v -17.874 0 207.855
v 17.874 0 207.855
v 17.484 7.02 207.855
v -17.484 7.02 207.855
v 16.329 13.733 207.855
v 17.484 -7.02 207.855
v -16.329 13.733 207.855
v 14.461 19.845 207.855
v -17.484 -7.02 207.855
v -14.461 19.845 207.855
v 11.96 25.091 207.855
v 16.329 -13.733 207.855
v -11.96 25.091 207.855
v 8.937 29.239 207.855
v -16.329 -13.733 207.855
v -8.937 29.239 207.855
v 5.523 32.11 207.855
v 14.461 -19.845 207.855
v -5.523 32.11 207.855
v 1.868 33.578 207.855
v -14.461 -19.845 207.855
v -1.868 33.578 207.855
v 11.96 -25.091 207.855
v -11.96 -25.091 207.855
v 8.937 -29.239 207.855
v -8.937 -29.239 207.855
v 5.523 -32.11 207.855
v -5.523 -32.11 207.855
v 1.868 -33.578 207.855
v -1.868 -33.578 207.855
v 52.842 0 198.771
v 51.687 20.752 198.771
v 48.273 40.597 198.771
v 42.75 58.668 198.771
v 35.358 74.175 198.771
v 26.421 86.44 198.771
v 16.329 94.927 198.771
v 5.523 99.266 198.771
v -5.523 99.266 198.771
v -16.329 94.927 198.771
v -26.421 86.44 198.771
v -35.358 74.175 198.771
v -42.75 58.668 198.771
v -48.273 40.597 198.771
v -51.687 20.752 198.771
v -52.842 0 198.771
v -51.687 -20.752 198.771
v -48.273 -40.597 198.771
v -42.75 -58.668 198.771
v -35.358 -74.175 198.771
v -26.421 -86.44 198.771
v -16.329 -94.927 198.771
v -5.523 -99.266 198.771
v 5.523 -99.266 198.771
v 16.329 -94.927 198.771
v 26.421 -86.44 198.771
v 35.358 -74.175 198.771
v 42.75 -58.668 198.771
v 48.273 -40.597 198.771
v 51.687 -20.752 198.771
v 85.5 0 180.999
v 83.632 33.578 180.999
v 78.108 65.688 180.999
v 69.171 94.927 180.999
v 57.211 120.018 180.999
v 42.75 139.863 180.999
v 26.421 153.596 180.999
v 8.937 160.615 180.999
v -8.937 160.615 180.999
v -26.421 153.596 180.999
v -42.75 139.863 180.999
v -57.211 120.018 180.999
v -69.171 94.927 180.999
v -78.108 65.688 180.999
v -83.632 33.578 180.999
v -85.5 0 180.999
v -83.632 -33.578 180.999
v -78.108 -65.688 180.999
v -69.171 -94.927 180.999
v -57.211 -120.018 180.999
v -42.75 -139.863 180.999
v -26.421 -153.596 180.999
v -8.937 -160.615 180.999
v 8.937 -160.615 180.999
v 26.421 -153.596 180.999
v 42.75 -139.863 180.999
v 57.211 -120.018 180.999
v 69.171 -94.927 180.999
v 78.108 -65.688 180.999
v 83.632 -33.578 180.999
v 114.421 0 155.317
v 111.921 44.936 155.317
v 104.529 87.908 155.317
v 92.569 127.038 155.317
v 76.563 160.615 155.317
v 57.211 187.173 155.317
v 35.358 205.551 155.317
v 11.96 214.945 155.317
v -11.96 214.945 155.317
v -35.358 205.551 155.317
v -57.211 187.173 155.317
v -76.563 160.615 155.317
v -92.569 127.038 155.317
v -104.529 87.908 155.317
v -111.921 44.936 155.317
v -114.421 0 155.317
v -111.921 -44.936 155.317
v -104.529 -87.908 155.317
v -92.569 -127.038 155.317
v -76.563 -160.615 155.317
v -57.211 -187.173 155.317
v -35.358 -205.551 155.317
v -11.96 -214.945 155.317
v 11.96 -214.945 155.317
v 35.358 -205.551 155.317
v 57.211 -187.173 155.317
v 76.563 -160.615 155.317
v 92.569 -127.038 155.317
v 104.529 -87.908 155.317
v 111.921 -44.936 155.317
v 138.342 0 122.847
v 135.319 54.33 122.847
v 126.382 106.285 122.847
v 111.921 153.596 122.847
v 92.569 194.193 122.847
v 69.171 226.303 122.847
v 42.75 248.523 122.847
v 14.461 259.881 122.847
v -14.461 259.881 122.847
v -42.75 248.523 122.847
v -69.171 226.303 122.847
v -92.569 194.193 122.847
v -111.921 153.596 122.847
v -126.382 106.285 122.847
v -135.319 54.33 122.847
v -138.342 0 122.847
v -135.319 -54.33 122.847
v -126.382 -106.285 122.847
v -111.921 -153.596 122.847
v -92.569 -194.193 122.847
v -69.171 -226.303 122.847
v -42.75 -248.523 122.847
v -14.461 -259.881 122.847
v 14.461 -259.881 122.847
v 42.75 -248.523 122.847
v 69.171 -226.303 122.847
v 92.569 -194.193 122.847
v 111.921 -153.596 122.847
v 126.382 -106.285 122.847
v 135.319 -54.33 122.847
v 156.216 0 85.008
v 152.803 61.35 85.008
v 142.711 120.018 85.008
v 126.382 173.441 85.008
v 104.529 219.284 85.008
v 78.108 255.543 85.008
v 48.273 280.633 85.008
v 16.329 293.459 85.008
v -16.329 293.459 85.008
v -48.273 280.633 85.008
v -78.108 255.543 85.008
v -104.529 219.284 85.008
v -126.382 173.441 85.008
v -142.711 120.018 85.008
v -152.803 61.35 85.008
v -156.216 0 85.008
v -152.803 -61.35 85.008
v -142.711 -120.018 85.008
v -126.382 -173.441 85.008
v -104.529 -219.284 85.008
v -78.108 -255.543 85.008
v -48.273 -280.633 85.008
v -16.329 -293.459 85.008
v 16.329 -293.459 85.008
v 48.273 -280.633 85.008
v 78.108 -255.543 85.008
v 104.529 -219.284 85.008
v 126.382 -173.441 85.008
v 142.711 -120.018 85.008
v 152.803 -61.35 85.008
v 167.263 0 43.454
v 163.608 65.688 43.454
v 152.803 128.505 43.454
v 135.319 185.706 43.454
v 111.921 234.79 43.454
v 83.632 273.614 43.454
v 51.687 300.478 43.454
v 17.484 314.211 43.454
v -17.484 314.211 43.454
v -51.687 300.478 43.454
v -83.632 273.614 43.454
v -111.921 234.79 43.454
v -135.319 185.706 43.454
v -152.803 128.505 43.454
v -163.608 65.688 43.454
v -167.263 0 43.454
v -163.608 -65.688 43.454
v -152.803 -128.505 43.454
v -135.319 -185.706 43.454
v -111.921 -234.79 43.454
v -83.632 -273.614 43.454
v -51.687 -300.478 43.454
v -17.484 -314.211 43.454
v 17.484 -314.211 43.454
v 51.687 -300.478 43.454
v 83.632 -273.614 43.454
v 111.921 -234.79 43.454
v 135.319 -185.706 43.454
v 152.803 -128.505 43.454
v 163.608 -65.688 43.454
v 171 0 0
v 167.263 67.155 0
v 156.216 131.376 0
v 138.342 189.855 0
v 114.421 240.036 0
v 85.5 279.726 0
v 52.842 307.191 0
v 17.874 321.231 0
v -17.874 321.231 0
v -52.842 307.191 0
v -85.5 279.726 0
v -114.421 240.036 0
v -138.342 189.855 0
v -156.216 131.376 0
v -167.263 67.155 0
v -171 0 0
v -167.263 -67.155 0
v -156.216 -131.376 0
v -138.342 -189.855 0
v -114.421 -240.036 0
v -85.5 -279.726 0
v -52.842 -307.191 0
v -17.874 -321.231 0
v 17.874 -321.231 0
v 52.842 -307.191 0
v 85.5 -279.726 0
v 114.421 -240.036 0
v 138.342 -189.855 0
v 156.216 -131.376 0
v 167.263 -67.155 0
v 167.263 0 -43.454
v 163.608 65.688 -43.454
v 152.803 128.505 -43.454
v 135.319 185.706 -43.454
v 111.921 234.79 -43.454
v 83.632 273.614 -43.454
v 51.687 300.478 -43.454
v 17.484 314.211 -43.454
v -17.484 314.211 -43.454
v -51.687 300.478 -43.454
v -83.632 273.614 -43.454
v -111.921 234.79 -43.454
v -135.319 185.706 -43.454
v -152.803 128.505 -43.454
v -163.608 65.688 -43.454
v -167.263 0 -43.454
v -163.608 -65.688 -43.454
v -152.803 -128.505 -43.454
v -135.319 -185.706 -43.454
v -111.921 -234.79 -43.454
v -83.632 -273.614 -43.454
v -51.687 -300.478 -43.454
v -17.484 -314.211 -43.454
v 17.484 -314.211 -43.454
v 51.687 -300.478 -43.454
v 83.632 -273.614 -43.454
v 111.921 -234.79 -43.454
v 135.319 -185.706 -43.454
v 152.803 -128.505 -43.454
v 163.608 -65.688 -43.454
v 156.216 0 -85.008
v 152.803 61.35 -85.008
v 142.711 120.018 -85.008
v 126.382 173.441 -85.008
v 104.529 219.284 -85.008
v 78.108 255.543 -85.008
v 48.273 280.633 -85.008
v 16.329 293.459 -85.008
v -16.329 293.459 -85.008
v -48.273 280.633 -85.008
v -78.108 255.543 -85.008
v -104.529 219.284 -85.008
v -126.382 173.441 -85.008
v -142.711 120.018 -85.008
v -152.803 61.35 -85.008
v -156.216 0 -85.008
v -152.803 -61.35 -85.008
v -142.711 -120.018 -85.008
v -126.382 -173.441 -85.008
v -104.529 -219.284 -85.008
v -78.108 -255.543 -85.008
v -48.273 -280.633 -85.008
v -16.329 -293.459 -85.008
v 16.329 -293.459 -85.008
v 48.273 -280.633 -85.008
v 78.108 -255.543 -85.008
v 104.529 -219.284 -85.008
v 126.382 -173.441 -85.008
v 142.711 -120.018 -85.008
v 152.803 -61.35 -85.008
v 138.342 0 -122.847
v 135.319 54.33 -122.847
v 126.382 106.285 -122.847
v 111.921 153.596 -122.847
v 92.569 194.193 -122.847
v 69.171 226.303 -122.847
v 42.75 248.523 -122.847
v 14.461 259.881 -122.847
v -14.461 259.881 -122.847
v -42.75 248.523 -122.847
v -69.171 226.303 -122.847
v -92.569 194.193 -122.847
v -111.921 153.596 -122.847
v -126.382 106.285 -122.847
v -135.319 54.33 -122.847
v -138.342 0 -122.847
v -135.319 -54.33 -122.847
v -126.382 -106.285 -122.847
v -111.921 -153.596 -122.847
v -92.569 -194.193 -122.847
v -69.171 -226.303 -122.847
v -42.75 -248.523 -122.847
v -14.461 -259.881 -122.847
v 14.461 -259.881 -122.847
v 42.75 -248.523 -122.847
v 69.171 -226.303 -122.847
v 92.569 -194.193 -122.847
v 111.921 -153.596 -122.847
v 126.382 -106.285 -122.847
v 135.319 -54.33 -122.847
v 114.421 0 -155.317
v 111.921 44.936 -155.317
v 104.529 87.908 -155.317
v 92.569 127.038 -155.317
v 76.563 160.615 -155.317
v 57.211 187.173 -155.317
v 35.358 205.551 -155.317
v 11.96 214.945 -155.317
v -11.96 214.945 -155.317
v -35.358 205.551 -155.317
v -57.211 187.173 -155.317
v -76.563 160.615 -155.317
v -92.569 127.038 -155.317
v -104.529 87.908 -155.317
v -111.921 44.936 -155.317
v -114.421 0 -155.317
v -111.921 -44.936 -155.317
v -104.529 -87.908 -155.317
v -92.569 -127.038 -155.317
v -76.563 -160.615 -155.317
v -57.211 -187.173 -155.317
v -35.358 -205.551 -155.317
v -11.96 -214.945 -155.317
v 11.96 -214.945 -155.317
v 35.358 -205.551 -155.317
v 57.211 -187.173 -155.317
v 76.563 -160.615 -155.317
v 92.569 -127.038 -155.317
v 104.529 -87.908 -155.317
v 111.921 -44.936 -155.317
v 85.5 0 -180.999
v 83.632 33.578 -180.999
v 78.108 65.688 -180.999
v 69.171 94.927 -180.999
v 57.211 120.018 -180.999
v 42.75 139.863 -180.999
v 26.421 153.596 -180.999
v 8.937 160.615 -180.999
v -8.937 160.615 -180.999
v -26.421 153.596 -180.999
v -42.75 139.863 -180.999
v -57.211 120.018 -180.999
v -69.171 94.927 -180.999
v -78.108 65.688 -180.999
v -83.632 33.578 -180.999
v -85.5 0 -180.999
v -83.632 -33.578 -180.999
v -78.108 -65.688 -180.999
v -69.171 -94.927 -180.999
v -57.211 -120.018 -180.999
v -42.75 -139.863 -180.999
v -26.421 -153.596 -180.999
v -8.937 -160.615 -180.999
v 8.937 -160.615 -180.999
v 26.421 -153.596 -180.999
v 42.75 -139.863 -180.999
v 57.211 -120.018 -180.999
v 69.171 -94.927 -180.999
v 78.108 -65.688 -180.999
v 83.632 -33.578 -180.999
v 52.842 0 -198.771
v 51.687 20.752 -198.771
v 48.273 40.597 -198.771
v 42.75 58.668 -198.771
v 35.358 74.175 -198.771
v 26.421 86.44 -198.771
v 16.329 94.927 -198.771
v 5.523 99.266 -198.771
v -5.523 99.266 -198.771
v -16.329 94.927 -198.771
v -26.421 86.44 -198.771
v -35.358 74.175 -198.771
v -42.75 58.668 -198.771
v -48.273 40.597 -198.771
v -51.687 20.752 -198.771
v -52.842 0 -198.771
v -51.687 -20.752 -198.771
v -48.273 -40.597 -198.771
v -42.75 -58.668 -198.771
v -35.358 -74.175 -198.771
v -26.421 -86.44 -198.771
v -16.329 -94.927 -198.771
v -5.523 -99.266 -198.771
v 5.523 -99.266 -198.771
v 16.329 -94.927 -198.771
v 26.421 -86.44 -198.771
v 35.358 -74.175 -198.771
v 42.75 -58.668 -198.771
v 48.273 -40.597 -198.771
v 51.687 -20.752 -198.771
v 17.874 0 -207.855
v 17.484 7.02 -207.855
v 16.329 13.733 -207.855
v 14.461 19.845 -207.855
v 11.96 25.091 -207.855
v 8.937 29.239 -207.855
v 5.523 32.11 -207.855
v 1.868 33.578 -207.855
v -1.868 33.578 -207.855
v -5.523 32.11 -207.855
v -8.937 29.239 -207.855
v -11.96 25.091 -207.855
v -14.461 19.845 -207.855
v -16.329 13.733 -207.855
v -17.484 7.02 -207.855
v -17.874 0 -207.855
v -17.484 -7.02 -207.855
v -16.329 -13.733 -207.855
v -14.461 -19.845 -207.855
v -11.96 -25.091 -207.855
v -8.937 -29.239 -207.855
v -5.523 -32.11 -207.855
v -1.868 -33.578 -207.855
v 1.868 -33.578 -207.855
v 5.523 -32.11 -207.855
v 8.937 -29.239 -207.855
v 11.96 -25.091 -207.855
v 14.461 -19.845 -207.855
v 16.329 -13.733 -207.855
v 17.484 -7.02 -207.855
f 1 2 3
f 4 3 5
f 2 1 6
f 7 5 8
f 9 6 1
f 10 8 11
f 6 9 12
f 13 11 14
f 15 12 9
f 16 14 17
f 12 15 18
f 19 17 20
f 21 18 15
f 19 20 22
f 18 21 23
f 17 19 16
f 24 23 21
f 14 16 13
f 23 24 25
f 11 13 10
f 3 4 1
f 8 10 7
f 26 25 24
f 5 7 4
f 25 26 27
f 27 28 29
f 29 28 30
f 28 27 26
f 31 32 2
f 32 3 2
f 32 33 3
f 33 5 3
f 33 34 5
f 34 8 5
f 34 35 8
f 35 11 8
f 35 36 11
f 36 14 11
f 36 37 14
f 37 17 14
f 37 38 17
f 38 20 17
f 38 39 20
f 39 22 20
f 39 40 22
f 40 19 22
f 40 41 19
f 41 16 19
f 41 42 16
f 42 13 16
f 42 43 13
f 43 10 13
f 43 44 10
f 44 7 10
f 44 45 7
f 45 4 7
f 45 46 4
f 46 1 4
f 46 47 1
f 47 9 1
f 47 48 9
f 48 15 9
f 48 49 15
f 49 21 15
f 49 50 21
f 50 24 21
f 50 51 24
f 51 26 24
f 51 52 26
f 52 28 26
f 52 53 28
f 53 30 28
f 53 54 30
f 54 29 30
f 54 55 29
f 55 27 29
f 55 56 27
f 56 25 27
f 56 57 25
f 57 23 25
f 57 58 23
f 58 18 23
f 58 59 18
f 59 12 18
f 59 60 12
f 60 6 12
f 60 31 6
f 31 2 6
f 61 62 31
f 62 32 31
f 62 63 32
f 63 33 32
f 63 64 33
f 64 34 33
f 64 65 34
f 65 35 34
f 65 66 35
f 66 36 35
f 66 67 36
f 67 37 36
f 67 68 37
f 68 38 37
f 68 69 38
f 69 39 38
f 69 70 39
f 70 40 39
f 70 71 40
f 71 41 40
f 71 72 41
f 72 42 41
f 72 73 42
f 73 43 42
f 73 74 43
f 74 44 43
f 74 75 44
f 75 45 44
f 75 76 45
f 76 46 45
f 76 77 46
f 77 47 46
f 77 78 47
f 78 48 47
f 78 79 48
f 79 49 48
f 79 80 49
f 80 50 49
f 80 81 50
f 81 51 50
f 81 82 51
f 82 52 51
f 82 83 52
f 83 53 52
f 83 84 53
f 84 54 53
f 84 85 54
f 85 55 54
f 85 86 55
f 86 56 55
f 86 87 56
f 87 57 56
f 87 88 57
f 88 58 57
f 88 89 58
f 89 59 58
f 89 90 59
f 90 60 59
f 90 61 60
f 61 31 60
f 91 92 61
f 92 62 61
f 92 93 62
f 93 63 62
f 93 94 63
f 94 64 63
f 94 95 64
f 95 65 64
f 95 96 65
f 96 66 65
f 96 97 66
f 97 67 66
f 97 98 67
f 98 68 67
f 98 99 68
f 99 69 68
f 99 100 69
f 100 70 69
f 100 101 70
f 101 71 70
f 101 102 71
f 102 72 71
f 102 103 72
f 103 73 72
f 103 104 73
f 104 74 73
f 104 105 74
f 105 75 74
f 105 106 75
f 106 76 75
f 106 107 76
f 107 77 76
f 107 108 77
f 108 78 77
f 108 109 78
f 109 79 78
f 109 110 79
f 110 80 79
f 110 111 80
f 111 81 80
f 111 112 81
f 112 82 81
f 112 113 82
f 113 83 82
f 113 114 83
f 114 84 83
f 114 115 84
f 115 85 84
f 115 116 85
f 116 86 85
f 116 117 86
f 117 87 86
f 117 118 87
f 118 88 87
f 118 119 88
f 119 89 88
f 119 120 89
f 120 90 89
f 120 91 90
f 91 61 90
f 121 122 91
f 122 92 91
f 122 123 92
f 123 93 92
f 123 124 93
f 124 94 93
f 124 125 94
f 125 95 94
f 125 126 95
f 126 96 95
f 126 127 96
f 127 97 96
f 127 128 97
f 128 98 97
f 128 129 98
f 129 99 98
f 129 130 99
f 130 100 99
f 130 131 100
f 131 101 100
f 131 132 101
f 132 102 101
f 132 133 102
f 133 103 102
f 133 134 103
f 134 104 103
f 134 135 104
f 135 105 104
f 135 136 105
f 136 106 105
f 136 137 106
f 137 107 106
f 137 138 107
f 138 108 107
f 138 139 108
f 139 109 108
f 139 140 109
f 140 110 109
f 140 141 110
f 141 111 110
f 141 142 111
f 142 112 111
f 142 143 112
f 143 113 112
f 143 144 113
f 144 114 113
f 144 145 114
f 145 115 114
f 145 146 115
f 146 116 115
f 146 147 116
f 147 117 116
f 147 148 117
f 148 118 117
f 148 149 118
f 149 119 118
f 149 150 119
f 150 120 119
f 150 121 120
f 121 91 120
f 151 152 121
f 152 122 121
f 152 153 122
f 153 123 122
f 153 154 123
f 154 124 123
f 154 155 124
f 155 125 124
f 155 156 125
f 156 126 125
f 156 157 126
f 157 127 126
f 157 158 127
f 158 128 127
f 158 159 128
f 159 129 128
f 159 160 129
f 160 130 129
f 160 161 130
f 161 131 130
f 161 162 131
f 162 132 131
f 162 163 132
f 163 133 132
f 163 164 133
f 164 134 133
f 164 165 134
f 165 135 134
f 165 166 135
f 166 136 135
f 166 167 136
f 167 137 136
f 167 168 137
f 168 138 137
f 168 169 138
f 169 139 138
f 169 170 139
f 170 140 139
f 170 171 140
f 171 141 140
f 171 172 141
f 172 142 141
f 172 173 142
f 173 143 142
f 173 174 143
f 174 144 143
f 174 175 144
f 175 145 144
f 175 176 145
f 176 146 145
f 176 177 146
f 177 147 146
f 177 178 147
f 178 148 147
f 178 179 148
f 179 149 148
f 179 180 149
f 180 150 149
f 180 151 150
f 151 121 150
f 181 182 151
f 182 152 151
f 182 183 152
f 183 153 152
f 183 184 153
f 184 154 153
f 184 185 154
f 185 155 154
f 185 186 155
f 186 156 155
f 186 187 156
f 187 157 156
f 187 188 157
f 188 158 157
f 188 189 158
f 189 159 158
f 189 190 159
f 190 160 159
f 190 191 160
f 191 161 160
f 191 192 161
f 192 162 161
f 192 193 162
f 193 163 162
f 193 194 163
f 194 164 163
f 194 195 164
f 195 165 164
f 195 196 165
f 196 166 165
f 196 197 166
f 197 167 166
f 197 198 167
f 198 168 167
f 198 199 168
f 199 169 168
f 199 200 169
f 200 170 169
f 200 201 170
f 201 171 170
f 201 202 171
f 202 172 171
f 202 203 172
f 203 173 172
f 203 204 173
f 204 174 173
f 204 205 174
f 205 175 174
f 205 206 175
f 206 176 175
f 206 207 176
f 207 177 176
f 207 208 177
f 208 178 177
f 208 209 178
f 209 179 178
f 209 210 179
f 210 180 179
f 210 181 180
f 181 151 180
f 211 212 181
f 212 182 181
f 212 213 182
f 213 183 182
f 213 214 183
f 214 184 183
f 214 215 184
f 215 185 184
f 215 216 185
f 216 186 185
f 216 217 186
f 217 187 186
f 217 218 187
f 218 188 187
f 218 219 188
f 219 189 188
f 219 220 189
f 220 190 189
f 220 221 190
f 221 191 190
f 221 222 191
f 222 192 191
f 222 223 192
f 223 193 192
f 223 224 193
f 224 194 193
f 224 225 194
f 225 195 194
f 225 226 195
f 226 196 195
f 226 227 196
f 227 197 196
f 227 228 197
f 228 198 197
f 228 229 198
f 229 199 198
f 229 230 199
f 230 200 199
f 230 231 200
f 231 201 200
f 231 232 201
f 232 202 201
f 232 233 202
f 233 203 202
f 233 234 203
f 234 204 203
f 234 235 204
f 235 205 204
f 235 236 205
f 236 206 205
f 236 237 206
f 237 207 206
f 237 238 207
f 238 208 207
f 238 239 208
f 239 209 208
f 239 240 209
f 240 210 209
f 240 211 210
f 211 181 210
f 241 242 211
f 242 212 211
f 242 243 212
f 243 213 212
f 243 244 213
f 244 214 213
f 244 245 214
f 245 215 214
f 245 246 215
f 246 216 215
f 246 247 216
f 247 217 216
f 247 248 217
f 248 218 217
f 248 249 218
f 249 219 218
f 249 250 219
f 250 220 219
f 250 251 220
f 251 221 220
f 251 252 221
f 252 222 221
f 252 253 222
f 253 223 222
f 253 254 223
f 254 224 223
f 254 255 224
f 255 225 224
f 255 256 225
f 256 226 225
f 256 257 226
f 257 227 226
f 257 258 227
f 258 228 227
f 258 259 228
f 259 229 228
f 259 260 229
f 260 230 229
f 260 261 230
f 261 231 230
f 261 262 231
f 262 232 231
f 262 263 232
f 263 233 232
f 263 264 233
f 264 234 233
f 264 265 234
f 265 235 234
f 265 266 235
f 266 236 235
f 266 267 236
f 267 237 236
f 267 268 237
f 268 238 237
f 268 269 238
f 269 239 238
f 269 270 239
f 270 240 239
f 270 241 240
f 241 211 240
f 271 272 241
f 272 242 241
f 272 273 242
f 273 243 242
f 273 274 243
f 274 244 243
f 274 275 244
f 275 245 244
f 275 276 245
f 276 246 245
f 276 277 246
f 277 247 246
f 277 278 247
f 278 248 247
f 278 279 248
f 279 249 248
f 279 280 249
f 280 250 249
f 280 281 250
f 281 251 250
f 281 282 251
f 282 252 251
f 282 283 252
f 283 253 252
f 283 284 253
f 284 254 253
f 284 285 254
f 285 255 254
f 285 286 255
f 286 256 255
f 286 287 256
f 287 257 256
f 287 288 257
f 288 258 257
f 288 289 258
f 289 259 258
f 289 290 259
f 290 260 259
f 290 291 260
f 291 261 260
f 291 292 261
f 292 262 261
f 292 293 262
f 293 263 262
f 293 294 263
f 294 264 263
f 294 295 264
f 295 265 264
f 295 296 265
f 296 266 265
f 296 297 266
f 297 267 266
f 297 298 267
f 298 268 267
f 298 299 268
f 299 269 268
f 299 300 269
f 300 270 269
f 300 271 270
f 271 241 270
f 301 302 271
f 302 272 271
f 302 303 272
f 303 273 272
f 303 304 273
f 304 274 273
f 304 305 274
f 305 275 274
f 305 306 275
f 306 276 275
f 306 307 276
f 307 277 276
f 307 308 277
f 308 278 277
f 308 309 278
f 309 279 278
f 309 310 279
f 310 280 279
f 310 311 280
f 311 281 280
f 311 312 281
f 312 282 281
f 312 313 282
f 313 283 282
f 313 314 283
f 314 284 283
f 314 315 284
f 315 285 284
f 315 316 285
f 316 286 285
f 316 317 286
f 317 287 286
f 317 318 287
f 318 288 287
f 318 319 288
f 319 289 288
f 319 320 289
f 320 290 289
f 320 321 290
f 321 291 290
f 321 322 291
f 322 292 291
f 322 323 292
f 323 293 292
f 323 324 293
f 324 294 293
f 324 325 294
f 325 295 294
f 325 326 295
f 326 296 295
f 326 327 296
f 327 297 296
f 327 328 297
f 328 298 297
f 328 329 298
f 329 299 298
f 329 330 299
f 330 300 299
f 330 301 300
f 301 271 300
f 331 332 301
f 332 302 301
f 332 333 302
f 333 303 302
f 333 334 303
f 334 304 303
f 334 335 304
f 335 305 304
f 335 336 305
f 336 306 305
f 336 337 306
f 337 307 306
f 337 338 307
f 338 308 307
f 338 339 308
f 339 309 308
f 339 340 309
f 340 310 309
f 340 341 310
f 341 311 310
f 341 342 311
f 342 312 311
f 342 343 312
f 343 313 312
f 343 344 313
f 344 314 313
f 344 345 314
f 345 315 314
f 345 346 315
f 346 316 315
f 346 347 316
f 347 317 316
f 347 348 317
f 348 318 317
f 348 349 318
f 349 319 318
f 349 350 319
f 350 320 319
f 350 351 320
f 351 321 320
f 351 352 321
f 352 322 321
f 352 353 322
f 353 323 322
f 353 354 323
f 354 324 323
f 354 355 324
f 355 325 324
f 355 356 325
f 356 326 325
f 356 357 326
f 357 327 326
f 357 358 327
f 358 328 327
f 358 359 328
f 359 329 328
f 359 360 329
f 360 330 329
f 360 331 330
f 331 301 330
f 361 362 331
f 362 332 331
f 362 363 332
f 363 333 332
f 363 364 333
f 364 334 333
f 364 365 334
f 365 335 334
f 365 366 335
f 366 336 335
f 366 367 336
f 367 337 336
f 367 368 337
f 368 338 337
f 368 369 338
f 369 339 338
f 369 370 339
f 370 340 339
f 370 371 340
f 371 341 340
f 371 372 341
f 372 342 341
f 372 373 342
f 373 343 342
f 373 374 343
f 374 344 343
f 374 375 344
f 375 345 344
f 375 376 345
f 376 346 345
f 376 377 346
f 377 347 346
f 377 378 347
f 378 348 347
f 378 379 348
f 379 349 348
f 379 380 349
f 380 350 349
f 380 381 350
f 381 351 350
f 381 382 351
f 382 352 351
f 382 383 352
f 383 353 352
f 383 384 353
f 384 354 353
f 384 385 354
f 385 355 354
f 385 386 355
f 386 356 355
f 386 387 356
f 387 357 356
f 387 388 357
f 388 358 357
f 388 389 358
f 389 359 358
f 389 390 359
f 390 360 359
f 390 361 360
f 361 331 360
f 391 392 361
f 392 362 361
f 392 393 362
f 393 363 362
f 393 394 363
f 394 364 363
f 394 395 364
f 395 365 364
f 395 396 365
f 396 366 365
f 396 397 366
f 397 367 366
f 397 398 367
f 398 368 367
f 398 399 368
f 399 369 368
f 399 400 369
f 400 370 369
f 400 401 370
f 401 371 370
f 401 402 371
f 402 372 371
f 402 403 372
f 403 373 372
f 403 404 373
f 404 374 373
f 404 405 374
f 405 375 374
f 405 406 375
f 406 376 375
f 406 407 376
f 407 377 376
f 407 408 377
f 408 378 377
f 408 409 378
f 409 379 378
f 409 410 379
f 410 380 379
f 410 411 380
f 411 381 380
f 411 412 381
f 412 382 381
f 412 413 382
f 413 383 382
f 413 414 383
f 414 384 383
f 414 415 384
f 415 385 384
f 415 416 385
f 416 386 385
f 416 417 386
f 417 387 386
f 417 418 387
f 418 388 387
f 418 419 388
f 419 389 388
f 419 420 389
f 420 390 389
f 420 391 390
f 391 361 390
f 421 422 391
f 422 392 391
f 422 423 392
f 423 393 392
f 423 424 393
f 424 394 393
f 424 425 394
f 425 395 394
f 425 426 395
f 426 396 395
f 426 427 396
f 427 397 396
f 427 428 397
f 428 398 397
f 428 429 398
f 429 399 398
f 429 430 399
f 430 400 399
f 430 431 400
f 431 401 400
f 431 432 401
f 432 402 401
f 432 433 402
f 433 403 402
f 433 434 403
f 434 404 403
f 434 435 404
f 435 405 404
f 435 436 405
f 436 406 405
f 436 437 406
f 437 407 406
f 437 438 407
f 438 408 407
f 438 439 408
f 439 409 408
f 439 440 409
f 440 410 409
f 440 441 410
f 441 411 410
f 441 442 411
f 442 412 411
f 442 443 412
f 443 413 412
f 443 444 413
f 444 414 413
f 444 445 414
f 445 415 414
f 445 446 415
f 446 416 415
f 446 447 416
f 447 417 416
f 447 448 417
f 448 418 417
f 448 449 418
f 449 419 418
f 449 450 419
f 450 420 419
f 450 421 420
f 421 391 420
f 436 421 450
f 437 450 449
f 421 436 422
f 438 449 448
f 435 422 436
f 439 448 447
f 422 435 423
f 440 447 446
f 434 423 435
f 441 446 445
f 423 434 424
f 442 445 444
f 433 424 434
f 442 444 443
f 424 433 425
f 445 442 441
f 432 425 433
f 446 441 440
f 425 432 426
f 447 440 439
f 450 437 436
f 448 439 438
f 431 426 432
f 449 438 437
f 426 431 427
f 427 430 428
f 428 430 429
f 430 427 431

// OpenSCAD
// Generated by SolidPython 1.0.1 on 2020-07-29 00:46:49


scale(v = [9, 17, 11]) {
	sphere(r = 19);
}
/***********************************************
*********      SolidPython code:      **********
************************************************
 
# import packages: SolidPython
from solid import *
from solid.utils import *
from itertools import chain, combinations, permutations


class Resize:

    def __init__(self, scad_file):
        self.scad_file = scad_file
        #self.scad_file = import_scad(scad_file)
        # cone/cylinder param:
        self.r1 = 0
        self.r2 = 0
        self.h = 0
        # rectangular prism param:
        self.w = 0
        self.l = 0
        # ellipse param:
        self.r = 0

    # import OpenScad code (file name corresponds to shape)


    # classify shape + parameters
    def assign(self, param1, param2, param3):
        if self.scad_file == 'cone.scad':
            self.r1 = param1
            self.r2 = param2
            self.h = param3
        elif self.scad_file == 'cylinder.scad':
            self.r1 = param1
            self.r2 = param2
            self.h = param3
        elif self.scad_file == 'rectangularPrism.scad':
            self.h = param1
            self.l = param2
            self.w = param3
        else:
            self.r = param1
            self.h = param2

    # resize parameters
    def iterate(self):
        x = range(3, 20, 2)
        i = 1
        if self.scad_file == 'cone.scad':
            tempList = list(permutations(x, 2))
            for temp in tempList:
                param1 = temp[0]
                param2 = temp[1]
                filepath = 'produced_scad_files/' + 'cone' + str(param1) + '_' + str(param2) + '_' + '.scad'
                scad_render_to_file(cylinder(h=param1, r1=param2, r2=0), filepath)

        elif self.scad_file == 'cylinder.scad':
            tempList = list(permutations(x, 3))
            for temp in tempList:
                param1 = temp[0]
                param2 = temp[1]
                filepath = 'produced_scad_files/' + 'cylinder' + str(param1) + '_' + str(param2) + '_' + '.scad'
                scad_render_to_file(cylinder(h=param1, r1=param2, r2=param2), filepath)

        elif self.scad_file == 'rectangularPrism.scad':
            tempList = list(permutations(x, 3))
            for temp in tempList:
                param1 = temp[0]
                param2 = temp[1]
                param3 = temp[2]
                filepath = 'produced_scad_files/' + 'rectangularPrism' + str(param1) + '_' + str(param2) + '_' + str(
                    param3) + '.scad'
                scad_render_to_file(cube(size=(param1, param2, param3)), filepath)

        elif self.scad_file == 'ellipse.scad':
            tempList = list(permutations(x, 4))
            for temp in tempList:
                param1 = temp[0]
                param2 = temp[1]
                param3 = temp[2]
                param4 = temp[3]
                filepath = 'produced_scad_files/' + 'ellipse' + str(param1) + '_' + str(param2) + '_' + str(param3) + '_' + str(param4) + '.scad'
                scad_render_to_file(scale([param1, param2, param3])(sphere(r=param4)), filepath)

    def render_to_scadfile(self):
        scad_render_to_file(scad, 'example.scad') 
 
************************************************/
